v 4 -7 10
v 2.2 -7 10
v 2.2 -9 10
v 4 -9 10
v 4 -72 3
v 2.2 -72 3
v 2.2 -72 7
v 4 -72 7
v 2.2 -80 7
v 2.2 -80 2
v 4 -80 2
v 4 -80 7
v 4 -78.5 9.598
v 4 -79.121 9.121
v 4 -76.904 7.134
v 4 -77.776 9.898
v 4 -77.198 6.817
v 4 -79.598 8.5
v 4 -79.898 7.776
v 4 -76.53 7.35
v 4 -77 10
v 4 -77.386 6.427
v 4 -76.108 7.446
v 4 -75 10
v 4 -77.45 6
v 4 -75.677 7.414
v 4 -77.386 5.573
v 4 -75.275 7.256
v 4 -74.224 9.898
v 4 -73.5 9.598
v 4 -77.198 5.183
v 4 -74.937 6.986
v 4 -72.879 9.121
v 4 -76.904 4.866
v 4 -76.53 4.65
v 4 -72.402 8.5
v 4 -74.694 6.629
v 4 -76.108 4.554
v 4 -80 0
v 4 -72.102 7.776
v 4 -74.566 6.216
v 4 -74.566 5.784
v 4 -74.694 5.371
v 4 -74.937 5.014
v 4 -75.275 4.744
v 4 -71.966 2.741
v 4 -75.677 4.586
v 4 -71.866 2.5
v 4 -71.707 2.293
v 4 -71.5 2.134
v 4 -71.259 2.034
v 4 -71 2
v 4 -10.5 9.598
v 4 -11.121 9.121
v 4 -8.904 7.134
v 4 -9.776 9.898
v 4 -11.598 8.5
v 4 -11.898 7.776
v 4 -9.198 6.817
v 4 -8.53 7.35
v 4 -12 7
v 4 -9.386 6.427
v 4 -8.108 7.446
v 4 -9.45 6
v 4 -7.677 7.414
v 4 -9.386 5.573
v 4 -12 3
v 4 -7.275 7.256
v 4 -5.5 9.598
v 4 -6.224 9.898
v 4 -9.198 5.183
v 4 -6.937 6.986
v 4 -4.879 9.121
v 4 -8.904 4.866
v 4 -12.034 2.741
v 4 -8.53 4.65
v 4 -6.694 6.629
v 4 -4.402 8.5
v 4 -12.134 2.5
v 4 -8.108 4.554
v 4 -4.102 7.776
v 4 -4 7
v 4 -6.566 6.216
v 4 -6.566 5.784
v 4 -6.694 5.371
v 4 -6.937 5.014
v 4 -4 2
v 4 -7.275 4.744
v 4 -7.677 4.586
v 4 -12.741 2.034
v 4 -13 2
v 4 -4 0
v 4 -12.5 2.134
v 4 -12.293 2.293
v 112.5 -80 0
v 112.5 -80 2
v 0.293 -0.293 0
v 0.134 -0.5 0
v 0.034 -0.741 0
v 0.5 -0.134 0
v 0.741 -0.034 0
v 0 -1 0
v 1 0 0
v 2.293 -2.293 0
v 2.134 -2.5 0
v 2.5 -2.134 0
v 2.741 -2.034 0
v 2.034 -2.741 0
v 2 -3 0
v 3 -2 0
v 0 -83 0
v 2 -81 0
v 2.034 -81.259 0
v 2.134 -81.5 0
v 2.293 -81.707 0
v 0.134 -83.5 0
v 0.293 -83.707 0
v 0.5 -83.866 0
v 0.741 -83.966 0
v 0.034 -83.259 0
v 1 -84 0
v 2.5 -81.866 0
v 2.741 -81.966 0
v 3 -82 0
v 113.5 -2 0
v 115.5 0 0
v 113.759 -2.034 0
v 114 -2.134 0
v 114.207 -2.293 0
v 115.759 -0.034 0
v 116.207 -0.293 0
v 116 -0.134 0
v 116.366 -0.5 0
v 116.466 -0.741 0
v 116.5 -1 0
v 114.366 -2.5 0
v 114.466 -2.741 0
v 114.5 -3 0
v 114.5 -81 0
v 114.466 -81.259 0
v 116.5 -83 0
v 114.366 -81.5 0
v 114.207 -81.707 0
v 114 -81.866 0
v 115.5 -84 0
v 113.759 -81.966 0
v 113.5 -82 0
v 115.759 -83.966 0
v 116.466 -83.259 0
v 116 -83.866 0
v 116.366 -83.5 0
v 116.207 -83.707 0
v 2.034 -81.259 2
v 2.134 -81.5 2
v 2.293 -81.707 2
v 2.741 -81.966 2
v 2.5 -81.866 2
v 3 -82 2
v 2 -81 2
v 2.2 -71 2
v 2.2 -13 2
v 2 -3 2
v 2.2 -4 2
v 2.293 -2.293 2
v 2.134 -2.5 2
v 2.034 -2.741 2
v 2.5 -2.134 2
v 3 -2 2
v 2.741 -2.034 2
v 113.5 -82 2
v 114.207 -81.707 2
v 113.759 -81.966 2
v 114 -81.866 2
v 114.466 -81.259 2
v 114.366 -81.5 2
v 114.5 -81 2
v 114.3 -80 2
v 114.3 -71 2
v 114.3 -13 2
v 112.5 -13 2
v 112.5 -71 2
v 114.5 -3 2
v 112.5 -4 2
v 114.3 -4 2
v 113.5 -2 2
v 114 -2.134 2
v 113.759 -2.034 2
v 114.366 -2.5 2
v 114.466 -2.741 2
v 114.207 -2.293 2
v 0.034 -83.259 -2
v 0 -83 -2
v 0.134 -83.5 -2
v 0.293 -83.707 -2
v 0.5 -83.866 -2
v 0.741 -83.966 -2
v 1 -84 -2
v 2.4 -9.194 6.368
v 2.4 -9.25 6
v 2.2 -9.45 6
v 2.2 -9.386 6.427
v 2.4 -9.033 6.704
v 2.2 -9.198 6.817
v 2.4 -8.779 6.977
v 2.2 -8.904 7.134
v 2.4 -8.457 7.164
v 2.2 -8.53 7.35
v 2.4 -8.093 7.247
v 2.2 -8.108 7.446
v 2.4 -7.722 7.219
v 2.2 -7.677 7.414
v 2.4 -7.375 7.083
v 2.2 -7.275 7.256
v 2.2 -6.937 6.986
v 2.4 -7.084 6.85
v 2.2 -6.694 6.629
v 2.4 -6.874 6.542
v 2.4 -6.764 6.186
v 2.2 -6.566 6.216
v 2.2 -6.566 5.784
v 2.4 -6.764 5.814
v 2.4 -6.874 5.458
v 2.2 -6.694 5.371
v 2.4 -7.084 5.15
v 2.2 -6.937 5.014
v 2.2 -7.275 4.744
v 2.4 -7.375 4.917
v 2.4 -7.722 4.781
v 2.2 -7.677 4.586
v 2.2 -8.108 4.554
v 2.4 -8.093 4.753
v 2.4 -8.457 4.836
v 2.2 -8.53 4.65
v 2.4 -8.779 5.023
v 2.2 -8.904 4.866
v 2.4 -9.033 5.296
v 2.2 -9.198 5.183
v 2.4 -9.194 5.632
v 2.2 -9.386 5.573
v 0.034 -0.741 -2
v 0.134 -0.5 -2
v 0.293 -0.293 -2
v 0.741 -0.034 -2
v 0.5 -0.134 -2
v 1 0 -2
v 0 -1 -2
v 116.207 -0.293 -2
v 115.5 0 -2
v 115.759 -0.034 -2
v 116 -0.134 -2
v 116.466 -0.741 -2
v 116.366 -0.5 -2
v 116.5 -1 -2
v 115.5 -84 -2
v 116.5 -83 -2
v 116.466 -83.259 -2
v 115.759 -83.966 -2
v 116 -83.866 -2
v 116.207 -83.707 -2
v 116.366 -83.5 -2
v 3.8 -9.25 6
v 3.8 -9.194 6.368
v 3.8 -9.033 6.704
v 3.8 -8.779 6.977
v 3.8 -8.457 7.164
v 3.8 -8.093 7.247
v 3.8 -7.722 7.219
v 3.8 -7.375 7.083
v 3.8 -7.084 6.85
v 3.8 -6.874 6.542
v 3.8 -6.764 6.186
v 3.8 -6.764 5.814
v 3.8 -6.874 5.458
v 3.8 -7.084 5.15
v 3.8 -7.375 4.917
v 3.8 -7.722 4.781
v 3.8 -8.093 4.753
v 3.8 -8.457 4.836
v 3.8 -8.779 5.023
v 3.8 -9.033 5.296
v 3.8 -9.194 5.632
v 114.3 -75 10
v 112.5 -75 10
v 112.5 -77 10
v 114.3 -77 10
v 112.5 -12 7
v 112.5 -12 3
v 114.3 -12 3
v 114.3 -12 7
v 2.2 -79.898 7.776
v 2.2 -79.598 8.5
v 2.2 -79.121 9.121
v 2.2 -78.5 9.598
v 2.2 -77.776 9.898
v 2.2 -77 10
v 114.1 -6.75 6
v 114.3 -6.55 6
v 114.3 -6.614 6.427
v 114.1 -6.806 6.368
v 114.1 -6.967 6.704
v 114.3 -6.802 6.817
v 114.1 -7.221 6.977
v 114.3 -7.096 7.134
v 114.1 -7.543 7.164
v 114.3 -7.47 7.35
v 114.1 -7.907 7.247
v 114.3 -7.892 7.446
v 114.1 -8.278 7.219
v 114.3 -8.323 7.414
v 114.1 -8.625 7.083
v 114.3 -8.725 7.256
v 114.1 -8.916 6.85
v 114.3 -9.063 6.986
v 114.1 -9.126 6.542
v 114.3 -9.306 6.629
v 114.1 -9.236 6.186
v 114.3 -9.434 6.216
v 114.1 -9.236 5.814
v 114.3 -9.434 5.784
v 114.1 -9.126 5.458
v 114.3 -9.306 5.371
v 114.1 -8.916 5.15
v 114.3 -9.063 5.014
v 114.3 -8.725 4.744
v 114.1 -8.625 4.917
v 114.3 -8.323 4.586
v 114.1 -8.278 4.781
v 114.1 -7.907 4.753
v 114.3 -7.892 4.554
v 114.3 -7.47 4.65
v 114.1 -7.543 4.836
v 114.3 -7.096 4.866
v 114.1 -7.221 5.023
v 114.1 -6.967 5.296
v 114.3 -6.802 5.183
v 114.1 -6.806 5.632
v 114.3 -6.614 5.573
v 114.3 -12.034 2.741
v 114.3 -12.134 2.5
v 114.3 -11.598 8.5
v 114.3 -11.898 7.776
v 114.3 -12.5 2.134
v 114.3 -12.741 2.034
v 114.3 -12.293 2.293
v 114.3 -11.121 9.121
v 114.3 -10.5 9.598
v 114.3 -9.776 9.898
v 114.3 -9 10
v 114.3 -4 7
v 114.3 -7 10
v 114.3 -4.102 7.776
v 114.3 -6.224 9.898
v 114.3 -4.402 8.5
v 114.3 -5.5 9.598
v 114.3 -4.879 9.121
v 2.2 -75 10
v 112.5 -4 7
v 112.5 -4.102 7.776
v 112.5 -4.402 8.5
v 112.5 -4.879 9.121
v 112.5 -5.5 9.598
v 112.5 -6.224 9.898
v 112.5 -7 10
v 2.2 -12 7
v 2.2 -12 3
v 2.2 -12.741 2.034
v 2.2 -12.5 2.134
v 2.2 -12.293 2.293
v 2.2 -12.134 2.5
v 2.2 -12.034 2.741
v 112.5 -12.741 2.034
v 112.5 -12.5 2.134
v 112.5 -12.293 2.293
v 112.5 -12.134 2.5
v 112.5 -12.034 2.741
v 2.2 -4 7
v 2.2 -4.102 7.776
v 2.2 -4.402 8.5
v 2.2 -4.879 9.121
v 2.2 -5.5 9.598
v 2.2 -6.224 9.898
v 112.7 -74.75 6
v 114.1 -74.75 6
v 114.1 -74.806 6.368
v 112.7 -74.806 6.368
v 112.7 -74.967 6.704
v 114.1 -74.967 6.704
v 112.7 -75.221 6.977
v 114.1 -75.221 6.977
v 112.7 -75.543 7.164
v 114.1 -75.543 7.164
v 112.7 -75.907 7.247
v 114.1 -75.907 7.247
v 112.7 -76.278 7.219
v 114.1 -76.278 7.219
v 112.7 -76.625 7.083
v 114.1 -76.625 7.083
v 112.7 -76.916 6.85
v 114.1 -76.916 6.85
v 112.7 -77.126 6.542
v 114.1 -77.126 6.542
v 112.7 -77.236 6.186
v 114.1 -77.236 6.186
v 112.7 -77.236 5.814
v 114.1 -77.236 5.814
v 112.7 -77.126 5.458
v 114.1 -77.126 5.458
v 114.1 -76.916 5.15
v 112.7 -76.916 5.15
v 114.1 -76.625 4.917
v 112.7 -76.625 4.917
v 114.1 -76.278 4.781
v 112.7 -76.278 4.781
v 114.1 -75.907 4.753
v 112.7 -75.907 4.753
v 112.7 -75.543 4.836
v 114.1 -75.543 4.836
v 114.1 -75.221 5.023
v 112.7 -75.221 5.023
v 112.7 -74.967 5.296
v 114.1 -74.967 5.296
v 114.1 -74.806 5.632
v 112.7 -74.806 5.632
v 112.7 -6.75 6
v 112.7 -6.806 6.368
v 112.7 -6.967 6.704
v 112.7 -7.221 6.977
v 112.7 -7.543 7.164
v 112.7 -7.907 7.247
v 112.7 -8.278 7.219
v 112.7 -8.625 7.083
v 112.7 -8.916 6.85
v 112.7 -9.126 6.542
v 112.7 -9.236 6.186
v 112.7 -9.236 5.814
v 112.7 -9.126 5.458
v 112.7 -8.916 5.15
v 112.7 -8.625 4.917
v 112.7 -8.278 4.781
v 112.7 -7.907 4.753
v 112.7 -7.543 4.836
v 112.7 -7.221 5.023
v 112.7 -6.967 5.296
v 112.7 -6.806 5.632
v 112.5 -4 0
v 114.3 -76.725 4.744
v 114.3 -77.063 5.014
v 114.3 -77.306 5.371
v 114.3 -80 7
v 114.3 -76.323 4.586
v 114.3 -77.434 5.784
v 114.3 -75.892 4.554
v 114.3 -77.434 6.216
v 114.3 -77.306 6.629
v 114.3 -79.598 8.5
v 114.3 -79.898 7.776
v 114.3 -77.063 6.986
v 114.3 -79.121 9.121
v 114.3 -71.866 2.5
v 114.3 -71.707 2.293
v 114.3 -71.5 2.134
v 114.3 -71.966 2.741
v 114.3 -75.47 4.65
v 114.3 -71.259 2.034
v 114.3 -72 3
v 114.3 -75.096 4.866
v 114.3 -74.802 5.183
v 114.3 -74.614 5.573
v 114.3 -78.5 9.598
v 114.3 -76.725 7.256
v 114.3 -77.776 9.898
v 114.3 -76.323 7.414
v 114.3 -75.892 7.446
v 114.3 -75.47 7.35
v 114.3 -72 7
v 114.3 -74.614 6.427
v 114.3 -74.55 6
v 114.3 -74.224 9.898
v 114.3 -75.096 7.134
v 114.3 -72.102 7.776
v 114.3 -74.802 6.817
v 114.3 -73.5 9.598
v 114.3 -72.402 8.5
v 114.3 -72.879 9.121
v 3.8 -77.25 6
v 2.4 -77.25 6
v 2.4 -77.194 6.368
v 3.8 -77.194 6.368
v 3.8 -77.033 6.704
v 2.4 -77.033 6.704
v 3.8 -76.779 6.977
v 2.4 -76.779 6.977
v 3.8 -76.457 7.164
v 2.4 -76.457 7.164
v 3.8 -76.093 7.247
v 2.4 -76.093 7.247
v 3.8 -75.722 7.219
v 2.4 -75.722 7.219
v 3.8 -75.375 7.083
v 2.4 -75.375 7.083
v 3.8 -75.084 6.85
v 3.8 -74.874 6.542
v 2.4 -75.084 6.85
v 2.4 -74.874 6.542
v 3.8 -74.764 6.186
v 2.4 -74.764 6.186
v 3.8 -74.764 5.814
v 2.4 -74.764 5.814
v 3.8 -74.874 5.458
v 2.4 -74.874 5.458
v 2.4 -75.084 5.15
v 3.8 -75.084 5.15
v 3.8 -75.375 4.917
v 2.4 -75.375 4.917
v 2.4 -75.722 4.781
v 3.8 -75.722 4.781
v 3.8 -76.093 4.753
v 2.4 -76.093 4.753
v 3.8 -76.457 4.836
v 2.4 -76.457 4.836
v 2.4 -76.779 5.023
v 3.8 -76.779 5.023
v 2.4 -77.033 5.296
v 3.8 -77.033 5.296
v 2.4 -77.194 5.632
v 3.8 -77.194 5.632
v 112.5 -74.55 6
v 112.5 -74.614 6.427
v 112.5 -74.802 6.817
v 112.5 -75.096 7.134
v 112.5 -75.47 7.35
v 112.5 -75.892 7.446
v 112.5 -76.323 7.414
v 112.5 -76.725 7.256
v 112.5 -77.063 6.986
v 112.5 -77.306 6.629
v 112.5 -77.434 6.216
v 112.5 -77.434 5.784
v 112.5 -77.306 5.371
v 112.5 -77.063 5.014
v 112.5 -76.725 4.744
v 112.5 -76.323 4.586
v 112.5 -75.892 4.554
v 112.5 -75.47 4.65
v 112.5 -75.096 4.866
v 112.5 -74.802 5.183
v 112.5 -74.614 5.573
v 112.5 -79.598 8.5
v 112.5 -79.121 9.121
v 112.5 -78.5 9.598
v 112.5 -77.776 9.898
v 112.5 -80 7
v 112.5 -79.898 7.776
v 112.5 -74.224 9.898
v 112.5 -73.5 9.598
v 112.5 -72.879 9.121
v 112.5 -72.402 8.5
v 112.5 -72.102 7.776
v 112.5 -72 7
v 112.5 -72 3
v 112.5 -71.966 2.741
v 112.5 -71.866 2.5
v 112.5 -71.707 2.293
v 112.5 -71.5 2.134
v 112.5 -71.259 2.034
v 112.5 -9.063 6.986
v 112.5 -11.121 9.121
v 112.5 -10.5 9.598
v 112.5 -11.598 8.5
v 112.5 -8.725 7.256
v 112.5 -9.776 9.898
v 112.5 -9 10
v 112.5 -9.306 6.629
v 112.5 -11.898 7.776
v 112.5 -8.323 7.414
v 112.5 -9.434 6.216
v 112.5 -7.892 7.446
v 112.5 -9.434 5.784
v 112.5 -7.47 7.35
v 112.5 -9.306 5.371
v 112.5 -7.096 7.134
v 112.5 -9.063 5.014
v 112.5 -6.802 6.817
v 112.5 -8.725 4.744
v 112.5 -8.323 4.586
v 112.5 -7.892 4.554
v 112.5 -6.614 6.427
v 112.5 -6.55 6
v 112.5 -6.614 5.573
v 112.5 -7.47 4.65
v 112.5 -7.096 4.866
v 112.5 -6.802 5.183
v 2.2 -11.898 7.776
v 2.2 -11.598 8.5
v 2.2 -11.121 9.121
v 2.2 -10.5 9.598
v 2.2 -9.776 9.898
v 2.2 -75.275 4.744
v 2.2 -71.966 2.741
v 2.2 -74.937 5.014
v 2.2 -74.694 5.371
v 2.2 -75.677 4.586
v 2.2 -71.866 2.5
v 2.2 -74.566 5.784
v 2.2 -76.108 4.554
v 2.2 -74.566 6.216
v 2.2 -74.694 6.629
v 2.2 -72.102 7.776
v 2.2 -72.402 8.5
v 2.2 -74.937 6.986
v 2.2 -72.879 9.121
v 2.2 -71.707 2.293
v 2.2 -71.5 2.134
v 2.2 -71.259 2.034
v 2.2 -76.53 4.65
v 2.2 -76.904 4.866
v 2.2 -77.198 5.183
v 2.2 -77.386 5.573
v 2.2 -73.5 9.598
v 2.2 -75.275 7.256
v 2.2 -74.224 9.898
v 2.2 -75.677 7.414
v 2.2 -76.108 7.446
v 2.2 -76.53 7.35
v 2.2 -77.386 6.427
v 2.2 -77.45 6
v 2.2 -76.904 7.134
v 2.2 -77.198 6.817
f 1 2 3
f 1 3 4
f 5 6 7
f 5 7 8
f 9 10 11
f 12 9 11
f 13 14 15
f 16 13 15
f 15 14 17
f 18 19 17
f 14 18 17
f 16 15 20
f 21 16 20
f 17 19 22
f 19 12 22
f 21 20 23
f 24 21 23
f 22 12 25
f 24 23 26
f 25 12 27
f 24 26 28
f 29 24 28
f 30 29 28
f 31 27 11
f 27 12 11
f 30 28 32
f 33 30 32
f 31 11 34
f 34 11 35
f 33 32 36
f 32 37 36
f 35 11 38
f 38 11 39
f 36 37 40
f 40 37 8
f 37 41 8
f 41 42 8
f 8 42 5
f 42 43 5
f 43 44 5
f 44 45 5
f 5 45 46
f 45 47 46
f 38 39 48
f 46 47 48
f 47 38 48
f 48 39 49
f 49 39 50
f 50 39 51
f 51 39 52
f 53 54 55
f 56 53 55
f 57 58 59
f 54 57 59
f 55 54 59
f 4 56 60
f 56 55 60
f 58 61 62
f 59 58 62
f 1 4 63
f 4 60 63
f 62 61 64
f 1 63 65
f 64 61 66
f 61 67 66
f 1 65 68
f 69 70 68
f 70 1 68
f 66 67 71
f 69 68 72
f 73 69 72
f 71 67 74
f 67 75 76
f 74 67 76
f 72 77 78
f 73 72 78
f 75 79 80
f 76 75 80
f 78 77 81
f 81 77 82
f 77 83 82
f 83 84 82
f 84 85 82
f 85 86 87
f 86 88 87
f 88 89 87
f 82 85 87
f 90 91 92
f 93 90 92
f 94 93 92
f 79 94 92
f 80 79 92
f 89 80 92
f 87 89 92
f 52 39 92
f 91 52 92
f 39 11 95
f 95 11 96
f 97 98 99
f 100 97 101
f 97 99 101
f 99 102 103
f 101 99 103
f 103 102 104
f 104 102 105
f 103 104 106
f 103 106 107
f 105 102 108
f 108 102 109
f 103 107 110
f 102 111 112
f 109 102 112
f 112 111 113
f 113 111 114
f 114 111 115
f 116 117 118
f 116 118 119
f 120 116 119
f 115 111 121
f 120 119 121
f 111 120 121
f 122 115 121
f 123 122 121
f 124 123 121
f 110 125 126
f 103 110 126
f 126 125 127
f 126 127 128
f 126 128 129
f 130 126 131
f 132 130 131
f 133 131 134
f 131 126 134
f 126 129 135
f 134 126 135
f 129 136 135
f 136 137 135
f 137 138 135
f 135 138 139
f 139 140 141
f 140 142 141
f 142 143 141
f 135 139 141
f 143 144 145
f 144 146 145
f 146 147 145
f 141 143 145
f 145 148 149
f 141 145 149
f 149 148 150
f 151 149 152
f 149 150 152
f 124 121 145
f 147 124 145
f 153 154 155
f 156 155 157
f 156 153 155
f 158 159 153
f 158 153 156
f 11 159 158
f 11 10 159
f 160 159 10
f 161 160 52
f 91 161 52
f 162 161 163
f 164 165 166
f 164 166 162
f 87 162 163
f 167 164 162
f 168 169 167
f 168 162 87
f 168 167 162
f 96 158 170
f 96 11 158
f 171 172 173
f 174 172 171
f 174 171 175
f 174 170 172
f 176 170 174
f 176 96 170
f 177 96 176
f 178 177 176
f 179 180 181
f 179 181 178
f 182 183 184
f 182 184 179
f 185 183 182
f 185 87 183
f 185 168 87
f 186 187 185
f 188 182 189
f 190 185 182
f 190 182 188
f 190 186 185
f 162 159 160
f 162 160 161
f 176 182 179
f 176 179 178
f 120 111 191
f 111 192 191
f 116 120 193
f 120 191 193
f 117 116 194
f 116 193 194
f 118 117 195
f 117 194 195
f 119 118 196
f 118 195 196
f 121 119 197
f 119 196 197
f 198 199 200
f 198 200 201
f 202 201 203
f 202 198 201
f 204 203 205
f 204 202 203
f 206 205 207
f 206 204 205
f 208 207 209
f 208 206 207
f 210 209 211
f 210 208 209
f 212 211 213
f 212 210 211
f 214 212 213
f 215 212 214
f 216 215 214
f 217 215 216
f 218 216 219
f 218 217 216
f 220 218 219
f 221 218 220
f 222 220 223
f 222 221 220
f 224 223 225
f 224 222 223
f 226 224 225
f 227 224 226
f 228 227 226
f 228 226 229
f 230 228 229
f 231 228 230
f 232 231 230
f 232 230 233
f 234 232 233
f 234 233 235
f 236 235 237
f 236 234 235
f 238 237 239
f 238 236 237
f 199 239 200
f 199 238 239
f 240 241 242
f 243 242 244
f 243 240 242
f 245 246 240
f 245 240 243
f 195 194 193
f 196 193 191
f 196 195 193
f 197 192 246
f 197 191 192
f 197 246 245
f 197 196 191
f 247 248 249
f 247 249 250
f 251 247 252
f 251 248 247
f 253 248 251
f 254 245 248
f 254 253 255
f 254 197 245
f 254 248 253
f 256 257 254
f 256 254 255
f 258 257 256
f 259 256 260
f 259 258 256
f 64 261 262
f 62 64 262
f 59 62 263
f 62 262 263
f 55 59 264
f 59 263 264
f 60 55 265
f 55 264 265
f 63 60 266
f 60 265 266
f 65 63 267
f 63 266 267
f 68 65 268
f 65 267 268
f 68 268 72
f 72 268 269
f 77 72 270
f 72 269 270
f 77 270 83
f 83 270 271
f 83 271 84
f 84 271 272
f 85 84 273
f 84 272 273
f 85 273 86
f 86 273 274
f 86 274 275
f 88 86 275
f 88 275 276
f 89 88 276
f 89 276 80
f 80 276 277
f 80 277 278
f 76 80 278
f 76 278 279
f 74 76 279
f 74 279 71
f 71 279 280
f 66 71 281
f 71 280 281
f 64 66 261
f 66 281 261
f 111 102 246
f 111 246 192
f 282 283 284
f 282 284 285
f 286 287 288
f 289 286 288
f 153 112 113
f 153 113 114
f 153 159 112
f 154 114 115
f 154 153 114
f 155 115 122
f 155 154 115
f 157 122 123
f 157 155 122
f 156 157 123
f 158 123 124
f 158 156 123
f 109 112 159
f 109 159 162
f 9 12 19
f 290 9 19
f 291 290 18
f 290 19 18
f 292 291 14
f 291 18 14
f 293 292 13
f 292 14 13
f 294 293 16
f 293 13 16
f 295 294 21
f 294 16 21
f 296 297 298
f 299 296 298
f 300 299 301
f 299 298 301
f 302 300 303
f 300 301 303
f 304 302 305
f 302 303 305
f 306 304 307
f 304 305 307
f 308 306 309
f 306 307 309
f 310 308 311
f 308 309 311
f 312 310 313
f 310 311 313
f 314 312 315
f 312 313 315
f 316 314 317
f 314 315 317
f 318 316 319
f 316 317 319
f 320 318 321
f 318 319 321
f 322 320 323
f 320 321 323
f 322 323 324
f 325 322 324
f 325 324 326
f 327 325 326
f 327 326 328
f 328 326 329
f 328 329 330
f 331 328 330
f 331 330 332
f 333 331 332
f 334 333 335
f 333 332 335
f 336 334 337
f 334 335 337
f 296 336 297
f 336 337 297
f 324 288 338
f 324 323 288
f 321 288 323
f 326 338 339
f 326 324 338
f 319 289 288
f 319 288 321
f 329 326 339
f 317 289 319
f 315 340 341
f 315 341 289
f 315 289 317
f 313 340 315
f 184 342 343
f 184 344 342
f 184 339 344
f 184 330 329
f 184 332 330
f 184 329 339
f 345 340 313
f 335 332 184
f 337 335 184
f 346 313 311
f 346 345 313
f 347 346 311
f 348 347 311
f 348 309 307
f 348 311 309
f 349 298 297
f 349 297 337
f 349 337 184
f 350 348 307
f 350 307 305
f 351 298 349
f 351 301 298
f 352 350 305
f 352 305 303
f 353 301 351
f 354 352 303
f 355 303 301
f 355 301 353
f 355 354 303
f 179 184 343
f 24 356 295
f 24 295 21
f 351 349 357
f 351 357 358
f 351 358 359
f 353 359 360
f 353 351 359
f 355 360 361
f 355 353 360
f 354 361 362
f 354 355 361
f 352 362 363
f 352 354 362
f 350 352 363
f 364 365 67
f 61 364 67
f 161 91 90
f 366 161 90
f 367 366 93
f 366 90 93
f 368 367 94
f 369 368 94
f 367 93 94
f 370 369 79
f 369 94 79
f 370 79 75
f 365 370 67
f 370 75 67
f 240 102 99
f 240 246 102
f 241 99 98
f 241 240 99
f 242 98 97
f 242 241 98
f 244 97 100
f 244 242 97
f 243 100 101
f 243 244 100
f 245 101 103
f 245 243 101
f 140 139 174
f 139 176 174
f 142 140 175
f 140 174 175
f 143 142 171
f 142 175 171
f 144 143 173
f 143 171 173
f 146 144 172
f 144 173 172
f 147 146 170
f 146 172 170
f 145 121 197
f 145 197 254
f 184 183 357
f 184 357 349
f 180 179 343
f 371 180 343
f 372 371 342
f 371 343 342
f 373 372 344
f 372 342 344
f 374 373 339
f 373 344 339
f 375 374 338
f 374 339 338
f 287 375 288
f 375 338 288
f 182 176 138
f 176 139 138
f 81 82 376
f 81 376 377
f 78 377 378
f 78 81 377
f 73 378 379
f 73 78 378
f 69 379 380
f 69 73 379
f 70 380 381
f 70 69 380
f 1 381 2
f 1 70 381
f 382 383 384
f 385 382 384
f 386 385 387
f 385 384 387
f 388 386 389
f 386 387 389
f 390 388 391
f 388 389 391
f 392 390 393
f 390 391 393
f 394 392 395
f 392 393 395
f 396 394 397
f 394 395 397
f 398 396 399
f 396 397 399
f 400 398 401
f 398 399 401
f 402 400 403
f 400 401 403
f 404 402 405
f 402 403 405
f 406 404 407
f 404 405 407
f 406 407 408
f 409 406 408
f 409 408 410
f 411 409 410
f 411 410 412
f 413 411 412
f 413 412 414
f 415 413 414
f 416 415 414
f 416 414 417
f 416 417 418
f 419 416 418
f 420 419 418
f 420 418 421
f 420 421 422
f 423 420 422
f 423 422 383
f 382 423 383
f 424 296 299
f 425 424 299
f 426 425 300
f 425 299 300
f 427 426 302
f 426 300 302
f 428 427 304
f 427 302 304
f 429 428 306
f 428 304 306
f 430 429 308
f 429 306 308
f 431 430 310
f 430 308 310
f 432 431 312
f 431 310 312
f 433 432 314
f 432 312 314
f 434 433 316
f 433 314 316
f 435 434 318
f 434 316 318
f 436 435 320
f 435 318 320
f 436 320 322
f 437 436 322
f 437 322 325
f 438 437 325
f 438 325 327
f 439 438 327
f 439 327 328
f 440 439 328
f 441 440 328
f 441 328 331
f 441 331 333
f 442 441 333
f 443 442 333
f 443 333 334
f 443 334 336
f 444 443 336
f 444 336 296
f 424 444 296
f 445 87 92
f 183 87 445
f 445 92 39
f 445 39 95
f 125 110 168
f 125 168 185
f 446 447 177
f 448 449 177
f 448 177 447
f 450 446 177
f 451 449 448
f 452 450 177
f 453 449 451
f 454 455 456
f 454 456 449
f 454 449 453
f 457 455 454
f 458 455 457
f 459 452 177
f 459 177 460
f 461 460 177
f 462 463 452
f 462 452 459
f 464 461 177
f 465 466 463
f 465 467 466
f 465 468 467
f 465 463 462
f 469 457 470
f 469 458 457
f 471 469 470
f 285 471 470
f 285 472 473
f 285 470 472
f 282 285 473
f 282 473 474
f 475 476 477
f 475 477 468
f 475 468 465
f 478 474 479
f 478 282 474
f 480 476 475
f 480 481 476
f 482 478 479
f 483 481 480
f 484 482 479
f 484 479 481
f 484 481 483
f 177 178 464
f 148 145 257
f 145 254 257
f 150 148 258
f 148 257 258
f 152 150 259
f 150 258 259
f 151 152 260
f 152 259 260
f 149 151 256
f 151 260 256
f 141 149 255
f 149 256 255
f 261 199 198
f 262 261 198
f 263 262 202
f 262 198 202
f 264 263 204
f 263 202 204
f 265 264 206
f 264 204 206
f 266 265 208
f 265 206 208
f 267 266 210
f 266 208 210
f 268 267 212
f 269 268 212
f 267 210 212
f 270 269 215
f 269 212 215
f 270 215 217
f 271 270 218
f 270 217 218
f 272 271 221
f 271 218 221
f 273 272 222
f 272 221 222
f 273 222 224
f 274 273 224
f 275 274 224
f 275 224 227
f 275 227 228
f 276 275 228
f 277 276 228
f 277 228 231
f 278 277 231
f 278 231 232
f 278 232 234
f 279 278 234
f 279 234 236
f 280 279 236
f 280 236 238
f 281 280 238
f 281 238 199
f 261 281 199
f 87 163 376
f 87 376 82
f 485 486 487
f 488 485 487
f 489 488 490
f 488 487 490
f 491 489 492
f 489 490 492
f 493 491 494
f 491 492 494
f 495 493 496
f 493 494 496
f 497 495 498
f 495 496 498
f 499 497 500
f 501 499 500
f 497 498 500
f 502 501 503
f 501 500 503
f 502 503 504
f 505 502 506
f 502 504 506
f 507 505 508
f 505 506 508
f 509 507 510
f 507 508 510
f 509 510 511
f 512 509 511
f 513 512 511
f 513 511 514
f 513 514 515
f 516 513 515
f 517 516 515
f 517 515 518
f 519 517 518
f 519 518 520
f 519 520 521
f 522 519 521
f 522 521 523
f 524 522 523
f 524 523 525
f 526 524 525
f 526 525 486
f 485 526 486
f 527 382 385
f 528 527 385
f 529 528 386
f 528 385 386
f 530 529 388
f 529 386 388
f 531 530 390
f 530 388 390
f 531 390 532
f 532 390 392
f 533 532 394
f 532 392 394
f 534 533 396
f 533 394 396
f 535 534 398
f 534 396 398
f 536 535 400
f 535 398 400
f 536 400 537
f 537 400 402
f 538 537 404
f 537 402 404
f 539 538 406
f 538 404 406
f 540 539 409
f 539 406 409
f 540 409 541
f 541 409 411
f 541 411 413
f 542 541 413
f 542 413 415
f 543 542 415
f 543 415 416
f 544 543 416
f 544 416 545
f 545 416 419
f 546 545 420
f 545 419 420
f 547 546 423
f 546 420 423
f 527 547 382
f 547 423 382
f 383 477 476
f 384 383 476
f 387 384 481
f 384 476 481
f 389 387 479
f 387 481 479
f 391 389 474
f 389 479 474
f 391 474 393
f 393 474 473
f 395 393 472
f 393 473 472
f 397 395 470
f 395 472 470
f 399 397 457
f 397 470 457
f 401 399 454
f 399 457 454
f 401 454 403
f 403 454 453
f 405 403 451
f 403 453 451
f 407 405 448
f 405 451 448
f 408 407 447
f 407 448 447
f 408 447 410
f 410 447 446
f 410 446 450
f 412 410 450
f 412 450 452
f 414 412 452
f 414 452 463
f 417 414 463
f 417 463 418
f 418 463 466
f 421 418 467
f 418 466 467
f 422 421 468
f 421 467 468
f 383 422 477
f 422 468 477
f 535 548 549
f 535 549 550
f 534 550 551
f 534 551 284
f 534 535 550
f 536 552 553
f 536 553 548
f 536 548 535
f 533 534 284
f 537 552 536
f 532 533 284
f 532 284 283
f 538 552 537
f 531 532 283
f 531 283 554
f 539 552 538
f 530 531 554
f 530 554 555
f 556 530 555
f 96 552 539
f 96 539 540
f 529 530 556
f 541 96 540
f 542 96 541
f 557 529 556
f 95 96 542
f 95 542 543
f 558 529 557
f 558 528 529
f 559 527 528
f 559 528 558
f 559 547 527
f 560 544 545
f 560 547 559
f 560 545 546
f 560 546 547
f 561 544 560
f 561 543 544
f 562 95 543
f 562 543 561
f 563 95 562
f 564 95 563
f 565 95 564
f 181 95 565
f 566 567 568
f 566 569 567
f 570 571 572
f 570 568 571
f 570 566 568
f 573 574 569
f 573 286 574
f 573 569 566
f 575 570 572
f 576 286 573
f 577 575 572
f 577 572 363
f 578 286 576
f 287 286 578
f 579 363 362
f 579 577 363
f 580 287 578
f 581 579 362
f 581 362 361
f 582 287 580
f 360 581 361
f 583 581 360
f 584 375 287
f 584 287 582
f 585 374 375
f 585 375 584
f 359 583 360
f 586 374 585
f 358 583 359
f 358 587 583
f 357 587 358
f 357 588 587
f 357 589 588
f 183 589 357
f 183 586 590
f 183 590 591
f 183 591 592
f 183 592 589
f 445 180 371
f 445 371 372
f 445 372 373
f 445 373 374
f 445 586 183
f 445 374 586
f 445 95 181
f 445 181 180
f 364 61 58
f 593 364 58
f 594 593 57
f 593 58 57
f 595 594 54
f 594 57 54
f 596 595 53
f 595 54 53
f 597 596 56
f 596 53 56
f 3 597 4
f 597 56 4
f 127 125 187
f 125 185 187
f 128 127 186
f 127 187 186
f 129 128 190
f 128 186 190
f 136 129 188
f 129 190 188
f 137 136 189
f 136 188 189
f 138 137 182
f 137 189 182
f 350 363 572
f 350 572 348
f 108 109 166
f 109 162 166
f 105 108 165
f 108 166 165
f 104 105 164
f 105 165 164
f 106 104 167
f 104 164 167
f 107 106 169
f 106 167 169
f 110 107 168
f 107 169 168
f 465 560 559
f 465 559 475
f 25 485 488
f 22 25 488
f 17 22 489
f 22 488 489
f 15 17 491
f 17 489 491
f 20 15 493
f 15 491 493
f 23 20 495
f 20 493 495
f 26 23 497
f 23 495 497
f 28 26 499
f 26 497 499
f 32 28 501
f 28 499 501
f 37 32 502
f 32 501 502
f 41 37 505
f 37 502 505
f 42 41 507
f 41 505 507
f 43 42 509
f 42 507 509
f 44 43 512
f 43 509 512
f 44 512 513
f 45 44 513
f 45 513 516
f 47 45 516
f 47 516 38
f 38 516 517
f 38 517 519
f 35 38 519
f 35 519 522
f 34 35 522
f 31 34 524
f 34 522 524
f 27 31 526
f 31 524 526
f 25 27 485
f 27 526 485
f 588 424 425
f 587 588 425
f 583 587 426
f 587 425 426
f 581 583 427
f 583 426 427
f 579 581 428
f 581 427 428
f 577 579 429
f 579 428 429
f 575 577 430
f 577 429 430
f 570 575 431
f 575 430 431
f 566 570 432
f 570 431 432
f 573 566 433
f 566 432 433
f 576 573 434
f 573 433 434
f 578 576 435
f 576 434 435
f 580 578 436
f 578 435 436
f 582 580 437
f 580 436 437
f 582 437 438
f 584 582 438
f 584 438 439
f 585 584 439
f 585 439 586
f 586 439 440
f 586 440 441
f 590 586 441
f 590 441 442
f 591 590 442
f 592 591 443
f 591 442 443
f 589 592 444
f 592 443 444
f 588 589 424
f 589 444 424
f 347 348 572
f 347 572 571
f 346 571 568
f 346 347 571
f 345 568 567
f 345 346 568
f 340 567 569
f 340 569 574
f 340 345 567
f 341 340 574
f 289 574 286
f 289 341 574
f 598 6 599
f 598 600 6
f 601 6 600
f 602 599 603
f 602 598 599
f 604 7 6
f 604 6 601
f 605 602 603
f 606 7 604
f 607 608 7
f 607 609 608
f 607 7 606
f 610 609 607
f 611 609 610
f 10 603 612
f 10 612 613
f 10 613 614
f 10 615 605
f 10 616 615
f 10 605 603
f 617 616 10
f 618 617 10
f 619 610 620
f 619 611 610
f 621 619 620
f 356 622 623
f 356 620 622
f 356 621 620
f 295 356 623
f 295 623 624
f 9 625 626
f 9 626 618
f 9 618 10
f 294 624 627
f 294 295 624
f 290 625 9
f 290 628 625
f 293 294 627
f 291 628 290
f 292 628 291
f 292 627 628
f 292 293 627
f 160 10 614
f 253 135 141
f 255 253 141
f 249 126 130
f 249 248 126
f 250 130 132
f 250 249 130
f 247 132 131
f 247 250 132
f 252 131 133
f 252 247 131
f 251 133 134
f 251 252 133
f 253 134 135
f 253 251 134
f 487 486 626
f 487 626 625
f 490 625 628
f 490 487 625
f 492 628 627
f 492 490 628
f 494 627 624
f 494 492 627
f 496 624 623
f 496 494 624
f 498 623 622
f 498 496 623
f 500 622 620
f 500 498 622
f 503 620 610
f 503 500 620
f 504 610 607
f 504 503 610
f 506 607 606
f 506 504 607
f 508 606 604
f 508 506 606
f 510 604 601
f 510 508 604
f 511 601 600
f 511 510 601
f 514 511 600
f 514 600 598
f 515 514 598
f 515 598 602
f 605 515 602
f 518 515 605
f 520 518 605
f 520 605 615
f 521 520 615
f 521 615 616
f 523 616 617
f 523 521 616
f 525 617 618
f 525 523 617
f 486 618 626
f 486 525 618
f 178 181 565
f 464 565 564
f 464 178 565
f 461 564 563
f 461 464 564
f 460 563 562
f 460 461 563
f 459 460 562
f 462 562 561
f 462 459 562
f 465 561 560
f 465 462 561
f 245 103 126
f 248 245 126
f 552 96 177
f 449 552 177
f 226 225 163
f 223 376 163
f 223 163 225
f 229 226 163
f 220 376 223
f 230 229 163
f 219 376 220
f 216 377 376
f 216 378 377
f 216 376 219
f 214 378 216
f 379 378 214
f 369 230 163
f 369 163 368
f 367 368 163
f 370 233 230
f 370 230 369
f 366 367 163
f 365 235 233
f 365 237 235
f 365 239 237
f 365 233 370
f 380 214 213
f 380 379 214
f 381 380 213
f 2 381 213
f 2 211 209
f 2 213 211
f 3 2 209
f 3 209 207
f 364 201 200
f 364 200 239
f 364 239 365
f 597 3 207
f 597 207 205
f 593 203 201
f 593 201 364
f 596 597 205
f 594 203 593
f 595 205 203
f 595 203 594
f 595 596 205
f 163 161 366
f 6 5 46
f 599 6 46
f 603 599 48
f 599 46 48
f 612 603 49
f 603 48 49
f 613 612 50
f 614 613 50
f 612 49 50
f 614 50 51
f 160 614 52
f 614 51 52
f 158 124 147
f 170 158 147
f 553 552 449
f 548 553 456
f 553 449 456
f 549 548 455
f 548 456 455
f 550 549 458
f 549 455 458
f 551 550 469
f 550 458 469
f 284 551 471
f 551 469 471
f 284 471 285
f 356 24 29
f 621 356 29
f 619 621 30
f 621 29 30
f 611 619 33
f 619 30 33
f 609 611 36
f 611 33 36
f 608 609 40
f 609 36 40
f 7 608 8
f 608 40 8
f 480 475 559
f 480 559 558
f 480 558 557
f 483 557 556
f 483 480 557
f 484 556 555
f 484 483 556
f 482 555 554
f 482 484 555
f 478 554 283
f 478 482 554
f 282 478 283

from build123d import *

# Parameters (mm, degrees)
SKETCH007_W     = 116.5
SKETCH007_H     = 84
PAD002_DEPTH    = 2
SKETCH008_W     = 112.5
SKETCH008_H     = 80
PAD003_DEPTH    = 2
SKETCH009_W     = 108.5
SKETCH009_H     = 76
POCKET004_DEPTH = 2
FILLET008_R     = 1
SKETCH010_W     = 2
SKETCH010_H     = 8
PAD004_DEPTH    = 8
FILLET010_R     = 3
SKETCH011_R     = 1.25
POCKET005_DEPTH = 2
SKETCH012_W     = 2
SKETCH012_H     = 8
PAD005_DEPTH    = 8
SKETCH013_W     = 2
SKETCH013_H     = 8
PAD006_DEPTH    = 8
SKETCH014_W     = 2
SKETCH014_H     = 8
PAD007_DEPTH    = 8
FILLET011_R     = 3
FILLET012_R     = 3
FILLET013_R     = 3
SKETCH015_R     = 1.25
POCKET006_DEPTH = 5
SKETCH016_R     = 1.25
POCKET007_DEPTH = 5
SKETCH017_R     = 1.25
POCKET008_DEPTH = 5
FILLET014_R     = 1
FILLET015_R     = 1
FILLET016_R     = 1
SKETCH018_W     = 88.5656
SKETCH018_H     = 13.4224
POCKET009_DEPTH = 0.2
SKETCH019_W     = 85.956
SKETCH019_H     = 9.716
POCKET010_DEPTH = 0.2
CHAMFER006_SIZE = 0.2
CHAMFER007_SIZE = 0.2
CHAMFER008_SIZE = 0.2
CHAMFER009_SIZE = 0.2


with BuildPart() as part:
    # Sketch007 → Pad002 (new body)
    with BuildSketch(Plane(origin=(0, 0, 0), x_dir=(1, 0, 0), z_dir=(0, 0, -1))):
        with Locations((58.25, 42)):
            Rectangle(SKETCH007_W, SKETCH007_H)
    extrude(amount=PAD002_DEPTH)

    # Sketch008 (on Face5 of Pad002) → Pad003 (new body)
    with BuildSketch(Plane.XY):
        with Locations((58.25, -42)):
            Rectangle(SKETCH008_W, SKETCH008_H)
    extrude(amount=PAD003_DEPTH)

    # Sketch009 (on Face11 of Pad003) → Pocket004 (cut)
    with BuildSketch(Plane.XY.offset(2)):
        with Locations((58.25, -42)):
            Rectangle(SKETCH009_W, SKETCH009_H)
    extrude(amount=-POCKET004_DEPTH, mode=Mode.SUBTRACT)

    # Fillet008
    fillet008_edges = [part.edges().sort_by_distance(p)[0] for p in [
        (0, 0, -1),
        (116.5, 0, -1),
        (0, -84, -1),
        (116.5, -84, -1),
        (114.5, -82, 1),
        (2, -82, 1),
        (114.5, -2, 1),
        (2, -2, 1),
    ]]
    fillet(fillet008_edges, radius=FILLET008_R)

    # Sketch010 (on Face19 of Fillet008) → Pad004 (new body)
    with BuildSketch(Plane.XY.offset(2)):
        with Locations((3, -8)):
            Rectangle(SKETCH010_W, SKETCH010_H)
    extrude(amount=PAD004_DEPTH)

    # Fillet010
    fillet010_edges = [part.edges().sort_by_distance(p)[0] for p in [
        (3, -4, 10),
        (3, -12, 10),
    ]]
    fillet(fillet010_edges, radius=FILLET010_R)

    # Sketch011 (on Face5 of Fillet010) → Pocket005 (cut)
    with BuildSketch(Plane(origin=(2, 0, 0), x_dir=(0, -1, 0), z_dir=(-1, 0, 0))):
        with Locations((8, 6)):
            Circle(SKETCH011_R)
    extrude(amount=-POCKET005_DEPTH, mode=Mode.SUBTRACT)

    # Sketch012 (on Face11 of Pocket005) → Pad005 (new body)
    with BuildSketch(Plane.XY.offset(2)):
        with Locations((3, -76)):
            Rectangle(SKETCH012_W, SKETCH012_H)
    extrude(amount=PAD005_DEPTH)

    # Sketch013 (on Face11 of Pad005) → Pad006 (new body)
    with BuildSketch(Plane.XY.offset(2)):
        with Locations((113.5, -8)):
            Rectangle(SKETCH013_W, SKETCH013_H)
    extrude(amount=PAD006_DEPTH)

    # Sketch014 (on Face20 of Pad006) → Pad007 (new body)
    with BuildSketch(Plane.XY.offset(2)):
        with Locations((113.5, -76)):
            Rectangle(SKETCH014_W, SKETCH014_H)
    extrude(amount=PAD007_DEPTH)

    # Fillet011
    fillet011_edges = [part.edges().sort_by_distance(p)[0] for p in [
        (113.5, -72, 10),
        (113.5, -80, 10),
    ]]
    fillet(fillet011_edges, radius=FILLET011_R)

    # Fillet012
    fillet012_edges = [part.edges().sort_by_distance(p)[0] for p in [
        (113.5, -4, 10),
        (113.5, -12, 10),
    ]]
    fillet(fillet012_edges, radius=FILLET012_R)

    # Fillet013
    fillet013_edges = [part.edges().sort_by_distance(p)[0] for p in [
        (3, -72, 10),
        (3, -80, 10),
    ]]
    fillet(fillet013_edges, radius=FILLET013_R)

    # Sketch015 (on Face2 of Fillet013) → Pocket006 (cut)
    with BuildSketch(Plane(origin=(2, 0, 0), x_dir=(0, -1, 0), z_dir=(-1, 0, 0))):
        with Locations((76, 6)):
            Circle(SKETCH015_R)
    extrude(amount=-POCKET006_DEPTH, mode=Mode.SUBTRACT)

    # Sketch016 (on Face25 of Pocket006) → Pocket007 (cut)
    with BuildSketch(Plane.YZ.offset(114.5)):
        with Locations((-76, 6)):
            Circle(SKETCH016_R)
    extrude(amount=-POCKET007_DEPTH, mode=Mode.SUBTRACT)

    # Sketch017 (on Face24 of Pocket007) → Pocket008 (cut)
    with BuildSketch(Plane.YZ.offset(114.5)):
        with Locations((-8, 6)):
            Circle(SKETCH017_R)
    extrude(amount=-POCKET008_DEPTH, mode=Mode.SUBTRACT)

    # Fillet014
    fillet014_edges = [part.edges().sort_by_distance(p)[0] for p in [
        (113.5, -72, 2),
    ]]
    fillet(fillet014_edges, radius=FILLET014_R)

    # Fillet015
    fillet015_edges = [part.edges().sort_by_distance(p)[0] for p in [
        (3, -72, 2),
        (3, -12, 2),
    ]]
    fillet(fillet015_edges, radius=FILLET015_R)

    # Fillet016
    fillet016_edges = [part.edges().sort_by_distance(p)[0] for p in [
        (113.5, -12, 2),
    ]]
    fillet(fillet016_edges, radius=FILLET016_R)

    # Sketch018 (on Face46 of Fillet016) → Pocket009 (cut)
    with BuildSketch(Plane(origin=(2, 0, 0), x_dir=(0, -1, 0), z_dir=(-1, 0, 0))):
        with Locations((42.9281, 8.7112)):
            Rectangle(SKETCH018_W, SKETCH018_H)
    extrude(amount=-POCKET009_DEPTH, mode=Mode.SUBTRACT)

    # Sketch019 (on Face4 of Pocket009) → Pocket010 (cut)
    with BuildSketch(Plane.YZ.offset(114.5)):
        with Locations((-38.022, 6.858)):
            Rectangle(SKETCH019_W, SKETCH019_H)
    extrude(amount=-POCKET010_DEPTH, mode=Mode.SUBTRACT)

    # Chamfer006
    chamfer006_edges = [part.edges().sort_by_distance(p)[0] for p in [
        (114.3, -9.25, 6),
    ]]
    chamfer(chamfer006_edges, length=CHAMFER006_SIZE)

    # Chamfer007
    chamfer007_edges = [part.edges().sort_by_distance(p)[0] for p in [
        (114.3, -77.25, 6),
    ]]
    chamfer(chamfer007_edges, length=CHAMFER007_SIZE)

    # Chamfer008
    chamfer008_edges = [part.edges().sort_by_distance(p)[0] for p in [
        (2.2, -74.75, 6),
        (2.2, -6.75, 6),
        (4, -6.75, 6),
        (4, -74.75, 6),
    ]]
    chamfer(chamfer008_edges, length=CHAMFER008_SIZE)

    # Chamfer009
    chamfer009_edges = [part.edges().sort_by_distance(p)[0] for p in [
        (112.5, -77.25, 6),
        (112.5, -9.25, 6),
    ]]
    chamfer(chamfer009_edges, length=CHAMFER009_SIZE)


solid = part.part
